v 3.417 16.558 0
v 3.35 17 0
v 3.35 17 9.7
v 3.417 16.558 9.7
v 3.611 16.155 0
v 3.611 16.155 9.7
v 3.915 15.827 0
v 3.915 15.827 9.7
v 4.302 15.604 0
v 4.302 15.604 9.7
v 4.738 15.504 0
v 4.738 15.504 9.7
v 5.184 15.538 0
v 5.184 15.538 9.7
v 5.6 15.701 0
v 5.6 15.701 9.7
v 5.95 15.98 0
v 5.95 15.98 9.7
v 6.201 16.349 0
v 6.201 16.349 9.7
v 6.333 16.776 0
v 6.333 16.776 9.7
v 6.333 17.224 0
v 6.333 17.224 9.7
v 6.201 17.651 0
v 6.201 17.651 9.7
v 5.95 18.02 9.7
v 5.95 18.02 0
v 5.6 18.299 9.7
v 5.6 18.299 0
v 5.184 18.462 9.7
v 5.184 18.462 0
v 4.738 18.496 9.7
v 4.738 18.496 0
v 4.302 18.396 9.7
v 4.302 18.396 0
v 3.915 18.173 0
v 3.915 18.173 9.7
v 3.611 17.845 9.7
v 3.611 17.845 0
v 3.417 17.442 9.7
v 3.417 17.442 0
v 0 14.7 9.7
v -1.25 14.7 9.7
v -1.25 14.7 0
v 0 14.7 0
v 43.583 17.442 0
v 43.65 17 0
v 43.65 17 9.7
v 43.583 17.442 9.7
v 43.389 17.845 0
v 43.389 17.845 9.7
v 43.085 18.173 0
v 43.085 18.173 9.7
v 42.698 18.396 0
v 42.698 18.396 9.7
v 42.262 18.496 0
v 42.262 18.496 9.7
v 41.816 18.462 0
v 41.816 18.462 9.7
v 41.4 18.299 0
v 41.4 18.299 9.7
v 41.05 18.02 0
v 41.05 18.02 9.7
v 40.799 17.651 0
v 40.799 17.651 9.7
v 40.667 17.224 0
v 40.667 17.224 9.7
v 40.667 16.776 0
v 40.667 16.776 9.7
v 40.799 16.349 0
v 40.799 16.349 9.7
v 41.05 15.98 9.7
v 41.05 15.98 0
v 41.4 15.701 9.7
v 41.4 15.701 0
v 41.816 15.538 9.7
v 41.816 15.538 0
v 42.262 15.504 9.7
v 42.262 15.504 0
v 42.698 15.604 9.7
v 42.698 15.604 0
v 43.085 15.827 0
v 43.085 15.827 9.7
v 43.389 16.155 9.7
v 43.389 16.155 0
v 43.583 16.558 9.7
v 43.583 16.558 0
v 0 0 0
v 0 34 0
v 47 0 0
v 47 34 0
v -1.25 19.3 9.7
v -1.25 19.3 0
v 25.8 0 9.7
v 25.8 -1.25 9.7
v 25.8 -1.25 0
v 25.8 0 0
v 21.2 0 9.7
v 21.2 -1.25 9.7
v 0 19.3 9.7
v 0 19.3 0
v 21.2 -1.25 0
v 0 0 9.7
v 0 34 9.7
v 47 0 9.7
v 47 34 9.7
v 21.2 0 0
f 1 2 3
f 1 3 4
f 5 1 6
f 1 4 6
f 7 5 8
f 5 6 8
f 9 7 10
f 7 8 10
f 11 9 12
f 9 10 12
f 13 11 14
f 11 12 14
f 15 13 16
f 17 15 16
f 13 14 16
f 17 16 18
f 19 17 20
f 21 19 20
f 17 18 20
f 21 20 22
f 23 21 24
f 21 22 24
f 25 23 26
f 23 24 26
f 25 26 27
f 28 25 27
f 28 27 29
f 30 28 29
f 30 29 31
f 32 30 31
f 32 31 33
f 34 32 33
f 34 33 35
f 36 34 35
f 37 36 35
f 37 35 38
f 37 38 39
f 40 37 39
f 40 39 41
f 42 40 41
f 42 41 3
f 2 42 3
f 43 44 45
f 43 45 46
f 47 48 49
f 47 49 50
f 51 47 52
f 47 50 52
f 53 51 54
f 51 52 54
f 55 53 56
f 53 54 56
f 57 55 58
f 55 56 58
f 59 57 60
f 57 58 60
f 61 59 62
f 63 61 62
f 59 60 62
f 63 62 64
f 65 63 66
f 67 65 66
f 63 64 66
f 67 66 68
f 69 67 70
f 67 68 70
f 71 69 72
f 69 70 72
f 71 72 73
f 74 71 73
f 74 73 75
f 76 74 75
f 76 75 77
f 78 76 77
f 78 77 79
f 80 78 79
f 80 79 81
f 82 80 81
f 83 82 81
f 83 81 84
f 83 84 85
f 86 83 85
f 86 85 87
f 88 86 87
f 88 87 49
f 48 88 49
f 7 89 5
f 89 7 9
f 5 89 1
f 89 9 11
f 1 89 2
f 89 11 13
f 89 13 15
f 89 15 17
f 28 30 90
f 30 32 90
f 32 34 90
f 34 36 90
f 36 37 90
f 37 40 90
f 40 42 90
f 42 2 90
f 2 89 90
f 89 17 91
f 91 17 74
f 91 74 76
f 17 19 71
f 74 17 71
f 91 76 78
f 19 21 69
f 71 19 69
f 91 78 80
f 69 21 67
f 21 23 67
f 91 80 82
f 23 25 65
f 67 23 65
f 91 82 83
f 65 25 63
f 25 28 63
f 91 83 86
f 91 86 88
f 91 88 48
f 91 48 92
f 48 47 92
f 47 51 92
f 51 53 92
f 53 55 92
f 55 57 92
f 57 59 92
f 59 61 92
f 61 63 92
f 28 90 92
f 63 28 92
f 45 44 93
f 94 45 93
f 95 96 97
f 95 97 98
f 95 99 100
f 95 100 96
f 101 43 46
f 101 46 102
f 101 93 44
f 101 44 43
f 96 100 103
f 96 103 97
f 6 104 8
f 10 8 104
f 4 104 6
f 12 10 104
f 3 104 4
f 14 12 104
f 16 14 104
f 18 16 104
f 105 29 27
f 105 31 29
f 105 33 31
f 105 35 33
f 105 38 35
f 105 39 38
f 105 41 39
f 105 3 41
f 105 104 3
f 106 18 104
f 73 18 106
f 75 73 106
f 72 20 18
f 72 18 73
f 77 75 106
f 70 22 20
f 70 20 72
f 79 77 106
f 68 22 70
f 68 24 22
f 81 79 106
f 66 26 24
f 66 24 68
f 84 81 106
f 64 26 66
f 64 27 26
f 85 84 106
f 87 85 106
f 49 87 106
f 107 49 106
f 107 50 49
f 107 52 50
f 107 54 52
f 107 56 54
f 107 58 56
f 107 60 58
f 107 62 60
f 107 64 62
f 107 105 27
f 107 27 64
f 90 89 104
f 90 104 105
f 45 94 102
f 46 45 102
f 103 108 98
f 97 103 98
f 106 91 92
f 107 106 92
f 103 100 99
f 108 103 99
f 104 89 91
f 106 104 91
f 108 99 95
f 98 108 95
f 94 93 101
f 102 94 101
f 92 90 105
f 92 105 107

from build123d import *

# Parameters (mm, degrees)
ESQUISSE1_W             = 47
ESQUISSE1_H             = 34
BOSS_EXTRU_1_DEPTH      = 9.7
ESQUISSE2_W             = 1.25
ESQUISSE2_H             = 4.6
BOSS_EXTRU_2_DEPTH      = 9.7
ESQUISSE2_W_2           = 4.6
ESQUISSE2_H_2           = 1.25
BOSS_EXTRU_2_2_DEPTH    = 9.7
ESQUISSE3_R             = 1.5
ENL_V_MAT_EXTRU_1_DEPTH = 59.814028939


with BuildPart() as part:
    # Esquisse1 → Boss.-Extru.1 (new body)
    with BuildSketch(Plane.XY):
        with Locations((23.5, 17)):
            Rectangle(ESQUISSE1_W, ESQUISSE1_H)
    extrude(amount=BOSS_EXTRU_1_DEPTH)

    # Esquisse3 → Enlèv. mat.-Extru.1 (cut, through all)
    with BuildSketch(Plane.XY.offset(9.7)):
        with Locations((42.15, 17)):
            Circle(ESQUISSE3_R)
        with Locations(Location((4.85, 17, 0), (0, 0, 180))):
            Circle(ESQUISSE3_R)
    extrude(amount=-ENL_V_MAT_EXTRU_1_DEPTH, mode=Mode.SUBTRACT)


with BuildPart() as body_2:
    # Esquisse2 → Boss.-Extru.2 (new, through all)
    with BuildSketch(Plane.XY.offset(9.7)):
        with Locations((-0.625, 17)):
            Rectangle(ESQUISSE2_W, ESQUISSE2_H)
    extrude(amount=-BOSS_EXTRU_2_DEPTH)


with BuildPart() as body_3:
    # Esquisse2 → Boss.-Extru.2 2 (new, through all)
    with BuildSketch(Plane.XY.offset(9.7)):
        with Locations((23.5, -0.625)):
            Rectangle(ESQUISSE2_W_2, ESQUISSE2_H_2)
    extrude(amount=-BOSS_EXTRU_2_2_DEPTH)


solid = Compound([part.part, body_2.part, body_3.part])
